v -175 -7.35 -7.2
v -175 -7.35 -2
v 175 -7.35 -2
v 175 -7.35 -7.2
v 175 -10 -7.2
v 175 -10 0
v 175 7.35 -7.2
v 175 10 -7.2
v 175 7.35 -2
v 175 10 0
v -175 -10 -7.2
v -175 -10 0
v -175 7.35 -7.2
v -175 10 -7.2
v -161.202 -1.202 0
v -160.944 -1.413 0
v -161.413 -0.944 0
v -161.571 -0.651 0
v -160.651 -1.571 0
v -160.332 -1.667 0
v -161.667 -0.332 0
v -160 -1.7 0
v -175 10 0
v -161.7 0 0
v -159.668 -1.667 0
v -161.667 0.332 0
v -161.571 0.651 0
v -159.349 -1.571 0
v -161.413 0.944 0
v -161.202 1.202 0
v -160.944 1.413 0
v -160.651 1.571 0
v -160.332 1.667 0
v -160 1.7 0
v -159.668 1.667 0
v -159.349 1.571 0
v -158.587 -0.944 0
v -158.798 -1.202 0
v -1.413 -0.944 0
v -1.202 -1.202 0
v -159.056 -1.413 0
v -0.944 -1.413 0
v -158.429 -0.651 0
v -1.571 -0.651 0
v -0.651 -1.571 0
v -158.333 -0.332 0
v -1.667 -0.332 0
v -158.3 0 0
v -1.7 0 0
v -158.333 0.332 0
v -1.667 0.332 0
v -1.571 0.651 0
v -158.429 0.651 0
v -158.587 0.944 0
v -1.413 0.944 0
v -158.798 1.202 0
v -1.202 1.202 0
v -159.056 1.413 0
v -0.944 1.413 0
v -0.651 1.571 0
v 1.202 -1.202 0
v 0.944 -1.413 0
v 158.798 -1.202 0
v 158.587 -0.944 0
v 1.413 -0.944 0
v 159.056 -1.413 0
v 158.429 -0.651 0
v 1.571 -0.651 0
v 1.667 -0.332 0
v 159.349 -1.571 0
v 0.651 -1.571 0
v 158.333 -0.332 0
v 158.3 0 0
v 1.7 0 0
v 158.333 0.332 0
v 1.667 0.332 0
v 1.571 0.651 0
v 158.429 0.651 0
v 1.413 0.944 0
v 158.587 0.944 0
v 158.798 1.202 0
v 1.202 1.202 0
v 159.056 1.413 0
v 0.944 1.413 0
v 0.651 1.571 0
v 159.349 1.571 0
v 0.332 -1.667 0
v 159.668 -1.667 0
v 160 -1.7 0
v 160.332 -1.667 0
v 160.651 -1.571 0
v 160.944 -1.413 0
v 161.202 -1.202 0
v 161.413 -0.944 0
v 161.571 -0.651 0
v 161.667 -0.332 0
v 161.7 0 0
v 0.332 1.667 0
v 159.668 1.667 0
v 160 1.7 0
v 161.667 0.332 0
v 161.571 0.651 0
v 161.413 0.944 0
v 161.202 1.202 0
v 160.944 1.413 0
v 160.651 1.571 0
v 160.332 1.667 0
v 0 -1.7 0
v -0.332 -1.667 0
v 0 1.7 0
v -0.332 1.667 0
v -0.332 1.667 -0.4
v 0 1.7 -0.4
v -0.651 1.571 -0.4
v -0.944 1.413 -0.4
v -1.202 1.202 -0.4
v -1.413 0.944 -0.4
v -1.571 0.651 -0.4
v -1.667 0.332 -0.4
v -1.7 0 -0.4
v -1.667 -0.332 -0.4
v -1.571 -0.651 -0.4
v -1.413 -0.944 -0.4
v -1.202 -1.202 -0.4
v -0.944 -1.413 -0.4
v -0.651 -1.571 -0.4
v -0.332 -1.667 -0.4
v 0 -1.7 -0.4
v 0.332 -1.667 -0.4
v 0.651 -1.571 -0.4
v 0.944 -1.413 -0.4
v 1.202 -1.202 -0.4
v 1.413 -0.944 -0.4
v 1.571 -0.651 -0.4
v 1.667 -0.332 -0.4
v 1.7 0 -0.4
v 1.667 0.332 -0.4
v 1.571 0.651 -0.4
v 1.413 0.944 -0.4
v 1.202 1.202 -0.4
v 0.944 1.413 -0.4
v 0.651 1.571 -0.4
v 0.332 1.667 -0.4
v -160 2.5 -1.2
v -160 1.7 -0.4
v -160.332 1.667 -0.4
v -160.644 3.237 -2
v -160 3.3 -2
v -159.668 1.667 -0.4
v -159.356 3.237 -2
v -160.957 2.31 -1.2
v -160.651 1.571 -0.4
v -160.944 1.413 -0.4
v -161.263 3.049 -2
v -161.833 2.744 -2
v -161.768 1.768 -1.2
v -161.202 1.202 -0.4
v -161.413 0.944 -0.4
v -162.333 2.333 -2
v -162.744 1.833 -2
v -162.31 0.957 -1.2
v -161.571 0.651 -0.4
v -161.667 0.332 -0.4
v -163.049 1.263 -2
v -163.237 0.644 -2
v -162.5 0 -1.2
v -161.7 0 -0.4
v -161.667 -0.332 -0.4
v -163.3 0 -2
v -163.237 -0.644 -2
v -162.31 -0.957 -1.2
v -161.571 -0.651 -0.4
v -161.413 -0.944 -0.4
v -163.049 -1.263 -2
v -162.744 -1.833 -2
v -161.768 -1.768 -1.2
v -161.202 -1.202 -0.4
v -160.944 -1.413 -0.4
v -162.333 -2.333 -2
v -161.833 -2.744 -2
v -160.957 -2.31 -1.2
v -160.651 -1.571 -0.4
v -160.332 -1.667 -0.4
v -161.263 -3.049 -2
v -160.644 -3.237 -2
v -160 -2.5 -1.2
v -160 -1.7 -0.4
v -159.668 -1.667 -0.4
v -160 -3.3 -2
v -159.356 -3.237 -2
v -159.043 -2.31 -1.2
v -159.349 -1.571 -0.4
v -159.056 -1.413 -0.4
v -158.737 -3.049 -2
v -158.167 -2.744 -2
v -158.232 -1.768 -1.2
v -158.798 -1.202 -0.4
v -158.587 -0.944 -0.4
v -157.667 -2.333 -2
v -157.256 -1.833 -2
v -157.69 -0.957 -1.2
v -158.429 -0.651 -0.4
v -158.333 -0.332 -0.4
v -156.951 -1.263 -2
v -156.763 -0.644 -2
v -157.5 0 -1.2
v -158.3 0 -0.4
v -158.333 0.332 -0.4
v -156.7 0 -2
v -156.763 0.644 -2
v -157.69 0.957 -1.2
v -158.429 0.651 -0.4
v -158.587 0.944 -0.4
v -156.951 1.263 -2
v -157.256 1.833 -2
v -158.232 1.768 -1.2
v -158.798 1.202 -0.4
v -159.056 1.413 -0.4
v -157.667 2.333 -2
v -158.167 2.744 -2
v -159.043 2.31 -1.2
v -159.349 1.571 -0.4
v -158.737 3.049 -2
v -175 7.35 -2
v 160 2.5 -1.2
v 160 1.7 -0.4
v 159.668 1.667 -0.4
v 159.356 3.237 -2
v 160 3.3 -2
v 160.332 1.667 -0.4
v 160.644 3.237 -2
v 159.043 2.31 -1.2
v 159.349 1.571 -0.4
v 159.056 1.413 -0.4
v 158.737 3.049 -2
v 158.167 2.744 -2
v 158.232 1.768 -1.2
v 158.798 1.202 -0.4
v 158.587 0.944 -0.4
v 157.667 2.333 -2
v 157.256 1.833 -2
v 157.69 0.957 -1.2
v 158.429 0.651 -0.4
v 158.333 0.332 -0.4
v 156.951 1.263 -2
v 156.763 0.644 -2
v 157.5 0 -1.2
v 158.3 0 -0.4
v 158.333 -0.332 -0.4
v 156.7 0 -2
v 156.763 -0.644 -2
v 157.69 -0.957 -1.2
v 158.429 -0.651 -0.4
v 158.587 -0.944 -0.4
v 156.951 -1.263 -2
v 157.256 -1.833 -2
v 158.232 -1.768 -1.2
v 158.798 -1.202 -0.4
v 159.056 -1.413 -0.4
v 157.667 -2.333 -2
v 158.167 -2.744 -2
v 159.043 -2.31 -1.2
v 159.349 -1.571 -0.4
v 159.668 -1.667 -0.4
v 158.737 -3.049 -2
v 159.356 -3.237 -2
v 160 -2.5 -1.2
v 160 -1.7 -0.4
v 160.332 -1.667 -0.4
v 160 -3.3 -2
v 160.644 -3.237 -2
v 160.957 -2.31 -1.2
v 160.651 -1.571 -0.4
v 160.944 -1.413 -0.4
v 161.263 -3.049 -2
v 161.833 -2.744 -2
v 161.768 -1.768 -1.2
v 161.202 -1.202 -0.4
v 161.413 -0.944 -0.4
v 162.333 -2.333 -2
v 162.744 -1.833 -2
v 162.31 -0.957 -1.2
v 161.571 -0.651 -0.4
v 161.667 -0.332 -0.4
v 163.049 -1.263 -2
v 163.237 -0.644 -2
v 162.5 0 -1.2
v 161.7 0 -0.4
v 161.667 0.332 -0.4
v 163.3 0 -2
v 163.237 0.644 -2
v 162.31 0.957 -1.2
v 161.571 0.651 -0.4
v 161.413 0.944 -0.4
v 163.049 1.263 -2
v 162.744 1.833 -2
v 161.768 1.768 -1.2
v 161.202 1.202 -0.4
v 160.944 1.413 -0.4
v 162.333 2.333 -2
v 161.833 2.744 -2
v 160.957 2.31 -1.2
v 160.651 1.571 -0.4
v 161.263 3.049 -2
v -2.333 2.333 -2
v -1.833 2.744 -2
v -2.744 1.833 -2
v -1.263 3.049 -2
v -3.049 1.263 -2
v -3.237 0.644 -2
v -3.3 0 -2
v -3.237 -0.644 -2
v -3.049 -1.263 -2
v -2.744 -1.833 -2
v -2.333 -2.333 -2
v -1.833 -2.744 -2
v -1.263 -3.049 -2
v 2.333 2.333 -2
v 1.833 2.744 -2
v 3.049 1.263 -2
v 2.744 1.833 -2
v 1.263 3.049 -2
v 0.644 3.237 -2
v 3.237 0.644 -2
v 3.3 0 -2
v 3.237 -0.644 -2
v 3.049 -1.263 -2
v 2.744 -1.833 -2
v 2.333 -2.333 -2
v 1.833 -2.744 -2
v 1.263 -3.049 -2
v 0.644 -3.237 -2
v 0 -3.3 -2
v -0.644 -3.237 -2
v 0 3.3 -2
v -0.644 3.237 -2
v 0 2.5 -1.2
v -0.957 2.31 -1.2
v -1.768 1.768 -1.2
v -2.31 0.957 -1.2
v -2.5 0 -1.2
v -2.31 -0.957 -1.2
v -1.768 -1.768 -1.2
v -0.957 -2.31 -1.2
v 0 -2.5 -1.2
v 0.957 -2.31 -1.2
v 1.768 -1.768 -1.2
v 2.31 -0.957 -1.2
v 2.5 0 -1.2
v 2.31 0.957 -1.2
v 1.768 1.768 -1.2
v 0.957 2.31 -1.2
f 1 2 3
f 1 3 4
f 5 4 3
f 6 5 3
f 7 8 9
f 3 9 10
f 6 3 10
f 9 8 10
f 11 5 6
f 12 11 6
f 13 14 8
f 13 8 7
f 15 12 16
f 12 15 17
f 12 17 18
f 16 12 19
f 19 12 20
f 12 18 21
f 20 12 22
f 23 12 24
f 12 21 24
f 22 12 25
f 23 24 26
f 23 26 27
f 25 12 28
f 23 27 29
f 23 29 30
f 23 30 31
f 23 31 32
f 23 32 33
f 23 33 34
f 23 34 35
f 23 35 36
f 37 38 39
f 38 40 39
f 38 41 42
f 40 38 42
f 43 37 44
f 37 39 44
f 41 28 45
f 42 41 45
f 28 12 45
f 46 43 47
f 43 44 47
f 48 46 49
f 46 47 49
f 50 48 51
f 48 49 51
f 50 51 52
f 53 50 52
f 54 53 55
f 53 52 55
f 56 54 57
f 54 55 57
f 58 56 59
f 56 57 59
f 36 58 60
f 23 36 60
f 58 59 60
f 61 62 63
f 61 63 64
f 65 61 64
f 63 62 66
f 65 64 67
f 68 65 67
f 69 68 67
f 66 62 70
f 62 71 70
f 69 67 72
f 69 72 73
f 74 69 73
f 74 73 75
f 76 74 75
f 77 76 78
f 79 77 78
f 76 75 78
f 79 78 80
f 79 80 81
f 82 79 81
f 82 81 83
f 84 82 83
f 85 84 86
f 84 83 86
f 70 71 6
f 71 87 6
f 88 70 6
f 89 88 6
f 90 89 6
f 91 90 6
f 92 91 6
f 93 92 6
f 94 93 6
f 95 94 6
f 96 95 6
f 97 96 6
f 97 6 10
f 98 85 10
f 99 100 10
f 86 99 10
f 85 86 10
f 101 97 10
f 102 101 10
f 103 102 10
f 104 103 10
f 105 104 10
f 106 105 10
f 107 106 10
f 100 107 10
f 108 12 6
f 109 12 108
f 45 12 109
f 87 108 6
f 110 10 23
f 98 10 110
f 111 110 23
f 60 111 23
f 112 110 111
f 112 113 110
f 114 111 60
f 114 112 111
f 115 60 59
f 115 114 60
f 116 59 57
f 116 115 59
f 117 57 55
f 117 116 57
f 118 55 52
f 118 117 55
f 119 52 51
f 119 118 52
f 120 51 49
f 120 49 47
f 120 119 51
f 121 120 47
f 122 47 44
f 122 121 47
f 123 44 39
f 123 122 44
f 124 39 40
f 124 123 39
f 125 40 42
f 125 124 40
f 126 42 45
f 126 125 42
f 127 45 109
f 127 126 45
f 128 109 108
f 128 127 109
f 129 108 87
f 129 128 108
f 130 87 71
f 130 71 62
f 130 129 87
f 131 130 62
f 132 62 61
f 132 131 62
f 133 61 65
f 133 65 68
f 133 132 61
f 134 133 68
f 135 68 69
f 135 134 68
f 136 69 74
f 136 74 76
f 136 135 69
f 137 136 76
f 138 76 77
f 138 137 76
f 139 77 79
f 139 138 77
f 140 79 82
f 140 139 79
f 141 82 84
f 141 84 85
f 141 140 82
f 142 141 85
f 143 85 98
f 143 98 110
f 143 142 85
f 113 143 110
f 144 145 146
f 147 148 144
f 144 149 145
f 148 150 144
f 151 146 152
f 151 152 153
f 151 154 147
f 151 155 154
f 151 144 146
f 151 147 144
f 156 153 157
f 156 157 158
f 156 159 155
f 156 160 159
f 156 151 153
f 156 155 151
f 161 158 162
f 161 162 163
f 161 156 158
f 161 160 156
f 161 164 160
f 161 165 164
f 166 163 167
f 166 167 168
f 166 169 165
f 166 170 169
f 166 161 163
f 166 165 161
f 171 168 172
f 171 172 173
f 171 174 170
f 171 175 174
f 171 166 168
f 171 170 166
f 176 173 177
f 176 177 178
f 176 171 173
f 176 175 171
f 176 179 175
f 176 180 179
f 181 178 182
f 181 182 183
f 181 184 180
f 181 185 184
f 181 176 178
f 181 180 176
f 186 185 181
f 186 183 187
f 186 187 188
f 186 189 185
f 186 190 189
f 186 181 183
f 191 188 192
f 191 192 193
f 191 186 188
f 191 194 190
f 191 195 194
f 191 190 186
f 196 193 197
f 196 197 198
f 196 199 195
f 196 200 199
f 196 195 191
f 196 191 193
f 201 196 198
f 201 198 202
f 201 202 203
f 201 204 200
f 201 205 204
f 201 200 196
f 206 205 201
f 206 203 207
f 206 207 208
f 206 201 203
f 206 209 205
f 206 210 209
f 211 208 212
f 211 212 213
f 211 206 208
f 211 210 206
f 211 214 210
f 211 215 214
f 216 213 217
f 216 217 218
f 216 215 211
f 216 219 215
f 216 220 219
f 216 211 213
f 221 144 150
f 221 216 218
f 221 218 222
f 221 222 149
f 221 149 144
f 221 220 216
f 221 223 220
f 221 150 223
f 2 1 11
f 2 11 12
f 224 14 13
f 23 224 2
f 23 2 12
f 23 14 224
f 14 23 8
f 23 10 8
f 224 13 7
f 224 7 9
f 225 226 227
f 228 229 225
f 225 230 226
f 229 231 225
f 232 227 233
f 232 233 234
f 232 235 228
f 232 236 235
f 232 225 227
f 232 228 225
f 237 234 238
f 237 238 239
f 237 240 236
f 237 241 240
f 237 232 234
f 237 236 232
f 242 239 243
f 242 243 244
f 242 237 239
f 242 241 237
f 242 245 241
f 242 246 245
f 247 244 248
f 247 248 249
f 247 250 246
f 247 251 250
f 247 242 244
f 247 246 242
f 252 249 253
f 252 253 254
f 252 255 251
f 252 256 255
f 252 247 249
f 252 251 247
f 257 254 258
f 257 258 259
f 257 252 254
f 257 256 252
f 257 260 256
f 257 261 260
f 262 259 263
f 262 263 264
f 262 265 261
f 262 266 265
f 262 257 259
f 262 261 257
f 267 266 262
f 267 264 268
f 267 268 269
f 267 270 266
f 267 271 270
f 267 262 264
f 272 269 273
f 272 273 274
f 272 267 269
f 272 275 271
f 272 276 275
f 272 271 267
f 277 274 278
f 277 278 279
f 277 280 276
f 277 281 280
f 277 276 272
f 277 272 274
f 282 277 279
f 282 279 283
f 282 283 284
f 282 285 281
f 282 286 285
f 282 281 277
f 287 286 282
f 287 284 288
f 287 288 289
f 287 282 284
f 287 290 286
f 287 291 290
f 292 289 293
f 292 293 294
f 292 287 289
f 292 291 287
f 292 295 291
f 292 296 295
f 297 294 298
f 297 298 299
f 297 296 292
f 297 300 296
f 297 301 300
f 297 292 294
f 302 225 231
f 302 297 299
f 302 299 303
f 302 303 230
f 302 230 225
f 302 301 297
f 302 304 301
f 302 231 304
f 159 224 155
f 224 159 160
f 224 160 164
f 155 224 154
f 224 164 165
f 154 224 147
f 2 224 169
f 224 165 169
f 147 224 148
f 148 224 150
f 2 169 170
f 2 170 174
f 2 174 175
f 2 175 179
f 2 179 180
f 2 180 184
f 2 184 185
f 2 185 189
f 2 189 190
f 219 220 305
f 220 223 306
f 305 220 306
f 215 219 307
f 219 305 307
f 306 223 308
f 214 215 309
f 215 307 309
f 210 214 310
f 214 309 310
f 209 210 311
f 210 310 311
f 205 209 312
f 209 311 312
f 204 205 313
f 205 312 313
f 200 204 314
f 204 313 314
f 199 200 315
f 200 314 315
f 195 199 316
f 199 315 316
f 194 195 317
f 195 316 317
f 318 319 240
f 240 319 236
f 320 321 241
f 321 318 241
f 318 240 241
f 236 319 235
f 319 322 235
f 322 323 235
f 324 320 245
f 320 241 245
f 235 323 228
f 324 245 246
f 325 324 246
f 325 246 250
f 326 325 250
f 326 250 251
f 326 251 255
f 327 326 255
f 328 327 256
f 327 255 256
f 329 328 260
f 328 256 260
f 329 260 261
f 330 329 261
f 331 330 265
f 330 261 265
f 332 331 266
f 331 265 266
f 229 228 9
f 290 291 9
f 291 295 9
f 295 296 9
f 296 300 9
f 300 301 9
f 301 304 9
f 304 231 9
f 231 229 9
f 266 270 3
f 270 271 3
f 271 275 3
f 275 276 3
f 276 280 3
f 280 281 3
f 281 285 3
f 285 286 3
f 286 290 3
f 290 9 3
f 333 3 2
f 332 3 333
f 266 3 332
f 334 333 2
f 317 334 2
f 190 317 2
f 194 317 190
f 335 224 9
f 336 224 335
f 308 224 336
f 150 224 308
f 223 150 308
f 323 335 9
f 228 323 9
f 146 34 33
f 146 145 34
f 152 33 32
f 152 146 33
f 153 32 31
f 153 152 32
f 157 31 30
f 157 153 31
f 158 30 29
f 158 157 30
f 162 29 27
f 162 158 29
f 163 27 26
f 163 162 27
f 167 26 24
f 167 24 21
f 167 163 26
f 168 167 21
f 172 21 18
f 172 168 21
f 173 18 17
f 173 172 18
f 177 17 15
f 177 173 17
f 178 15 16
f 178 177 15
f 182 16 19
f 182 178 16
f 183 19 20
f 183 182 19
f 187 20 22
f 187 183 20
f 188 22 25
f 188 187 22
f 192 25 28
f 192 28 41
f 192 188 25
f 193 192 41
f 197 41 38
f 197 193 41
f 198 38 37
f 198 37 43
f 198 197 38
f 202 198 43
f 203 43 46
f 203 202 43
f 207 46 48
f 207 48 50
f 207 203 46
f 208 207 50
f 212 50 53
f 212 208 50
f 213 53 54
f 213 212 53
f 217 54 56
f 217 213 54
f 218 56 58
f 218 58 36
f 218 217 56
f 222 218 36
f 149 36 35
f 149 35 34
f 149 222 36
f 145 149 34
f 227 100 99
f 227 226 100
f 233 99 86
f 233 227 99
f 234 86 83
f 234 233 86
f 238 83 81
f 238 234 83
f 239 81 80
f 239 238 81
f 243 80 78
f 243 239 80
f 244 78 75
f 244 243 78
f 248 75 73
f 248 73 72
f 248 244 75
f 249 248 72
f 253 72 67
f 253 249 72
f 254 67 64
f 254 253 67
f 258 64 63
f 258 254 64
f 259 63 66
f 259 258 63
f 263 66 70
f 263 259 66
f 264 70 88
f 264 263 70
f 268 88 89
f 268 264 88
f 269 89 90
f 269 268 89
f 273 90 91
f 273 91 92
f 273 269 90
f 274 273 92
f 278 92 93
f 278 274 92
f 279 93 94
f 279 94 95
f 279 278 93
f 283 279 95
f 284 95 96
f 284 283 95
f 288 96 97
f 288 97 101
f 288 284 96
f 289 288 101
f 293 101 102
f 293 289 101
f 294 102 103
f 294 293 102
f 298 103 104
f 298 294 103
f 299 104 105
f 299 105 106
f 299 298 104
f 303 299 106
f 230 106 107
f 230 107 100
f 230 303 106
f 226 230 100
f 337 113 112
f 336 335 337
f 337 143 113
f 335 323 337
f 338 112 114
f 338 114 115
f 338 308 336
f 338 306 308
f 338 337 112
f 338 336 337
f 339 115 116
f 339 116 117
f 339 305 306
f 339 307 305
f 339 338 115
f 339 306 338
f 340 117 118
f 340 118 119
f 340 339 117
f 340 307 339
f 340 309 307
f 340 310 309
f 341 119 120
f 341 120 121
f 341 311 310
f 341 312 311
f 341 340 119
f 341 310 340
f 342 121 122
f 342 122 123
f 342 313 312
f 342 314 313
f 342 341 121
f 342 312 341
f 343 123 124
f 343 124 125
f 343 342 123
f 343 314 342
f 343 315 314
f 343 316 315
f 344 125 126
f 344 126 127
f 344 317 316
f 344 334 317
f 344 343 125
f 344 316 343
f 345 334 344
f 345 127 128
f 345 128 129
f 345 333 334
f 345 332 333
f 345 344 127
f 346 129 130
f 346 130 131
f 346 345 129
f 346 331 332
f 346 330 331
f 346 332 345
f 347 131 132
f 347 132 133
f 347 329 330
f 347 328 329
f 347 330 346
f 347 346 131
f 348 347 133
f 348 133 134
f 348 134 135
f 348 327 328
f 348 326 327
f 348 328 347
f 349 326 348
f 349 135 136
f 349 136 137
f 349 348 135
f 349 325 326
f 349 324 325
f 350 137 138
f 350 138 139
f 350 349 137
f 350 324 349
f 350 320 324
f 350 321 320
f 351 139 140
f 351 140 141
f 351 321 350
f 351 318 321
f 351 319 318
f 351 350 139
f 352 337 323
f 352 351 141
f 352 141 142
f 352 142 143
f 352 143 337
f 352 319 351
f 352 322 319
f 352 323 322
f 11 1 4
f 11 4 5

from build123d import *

# Parameters (mm, degrees)
EXTRUDE_1_DEPTH        = 175
PATTERN_LINEAR_1_COUNT = 3
PATTERN_LINEAR_1_PITCH = 160


with BuildPart() as part:
    # 草图1 → 凸台-拉伸1 (new, symmetric)
    with BuildSketch(Plane(origin=(0, 0, 0), x_dir=(0, 0, -1), z_dir=(1, 0, 0))):
        Polygon((0, -10), (0, 10), (7.2, 10), (7.2, 7.35), (2, 7.35), (2, -7.35), (7.2, -7.35), (7.2, -10), align=None)
    extrude(amount=EXTRUDE_1_DEPTH, both=True)

    # 草图5 → M3 开槽半沉头木螺钉的锥形沉头孔1 (revolve, cut)
    with BuildSketch(Plane(origin=(160, 0, -2), x_dir=(0, 1, 0), z_dir=(1, 0, 0))):
        Polygon((0, 0), (0, 2), (1.7, 2), (1.7, 1.6), (3.3, 0), align=None)
    hole_wizard_m3_1 = revolve(axis=Axis((160, 0, -8.35), (0, 0, 1)), mode=Mode.SUBTRACT)

    # 阵列(线性)1: M3 开槽半沉头木螺钉的锥形沉头孔1 ×3
    with Locations(*[(-i * PATTERN_LINEAR_1_PITCH, 0, 0) for i in range(1, PATTERN_LINEAR_1_COUNT)]):
        add(hole_wizard_m3_1, mode=Mode.SUBTRACT)


solid = part.part
